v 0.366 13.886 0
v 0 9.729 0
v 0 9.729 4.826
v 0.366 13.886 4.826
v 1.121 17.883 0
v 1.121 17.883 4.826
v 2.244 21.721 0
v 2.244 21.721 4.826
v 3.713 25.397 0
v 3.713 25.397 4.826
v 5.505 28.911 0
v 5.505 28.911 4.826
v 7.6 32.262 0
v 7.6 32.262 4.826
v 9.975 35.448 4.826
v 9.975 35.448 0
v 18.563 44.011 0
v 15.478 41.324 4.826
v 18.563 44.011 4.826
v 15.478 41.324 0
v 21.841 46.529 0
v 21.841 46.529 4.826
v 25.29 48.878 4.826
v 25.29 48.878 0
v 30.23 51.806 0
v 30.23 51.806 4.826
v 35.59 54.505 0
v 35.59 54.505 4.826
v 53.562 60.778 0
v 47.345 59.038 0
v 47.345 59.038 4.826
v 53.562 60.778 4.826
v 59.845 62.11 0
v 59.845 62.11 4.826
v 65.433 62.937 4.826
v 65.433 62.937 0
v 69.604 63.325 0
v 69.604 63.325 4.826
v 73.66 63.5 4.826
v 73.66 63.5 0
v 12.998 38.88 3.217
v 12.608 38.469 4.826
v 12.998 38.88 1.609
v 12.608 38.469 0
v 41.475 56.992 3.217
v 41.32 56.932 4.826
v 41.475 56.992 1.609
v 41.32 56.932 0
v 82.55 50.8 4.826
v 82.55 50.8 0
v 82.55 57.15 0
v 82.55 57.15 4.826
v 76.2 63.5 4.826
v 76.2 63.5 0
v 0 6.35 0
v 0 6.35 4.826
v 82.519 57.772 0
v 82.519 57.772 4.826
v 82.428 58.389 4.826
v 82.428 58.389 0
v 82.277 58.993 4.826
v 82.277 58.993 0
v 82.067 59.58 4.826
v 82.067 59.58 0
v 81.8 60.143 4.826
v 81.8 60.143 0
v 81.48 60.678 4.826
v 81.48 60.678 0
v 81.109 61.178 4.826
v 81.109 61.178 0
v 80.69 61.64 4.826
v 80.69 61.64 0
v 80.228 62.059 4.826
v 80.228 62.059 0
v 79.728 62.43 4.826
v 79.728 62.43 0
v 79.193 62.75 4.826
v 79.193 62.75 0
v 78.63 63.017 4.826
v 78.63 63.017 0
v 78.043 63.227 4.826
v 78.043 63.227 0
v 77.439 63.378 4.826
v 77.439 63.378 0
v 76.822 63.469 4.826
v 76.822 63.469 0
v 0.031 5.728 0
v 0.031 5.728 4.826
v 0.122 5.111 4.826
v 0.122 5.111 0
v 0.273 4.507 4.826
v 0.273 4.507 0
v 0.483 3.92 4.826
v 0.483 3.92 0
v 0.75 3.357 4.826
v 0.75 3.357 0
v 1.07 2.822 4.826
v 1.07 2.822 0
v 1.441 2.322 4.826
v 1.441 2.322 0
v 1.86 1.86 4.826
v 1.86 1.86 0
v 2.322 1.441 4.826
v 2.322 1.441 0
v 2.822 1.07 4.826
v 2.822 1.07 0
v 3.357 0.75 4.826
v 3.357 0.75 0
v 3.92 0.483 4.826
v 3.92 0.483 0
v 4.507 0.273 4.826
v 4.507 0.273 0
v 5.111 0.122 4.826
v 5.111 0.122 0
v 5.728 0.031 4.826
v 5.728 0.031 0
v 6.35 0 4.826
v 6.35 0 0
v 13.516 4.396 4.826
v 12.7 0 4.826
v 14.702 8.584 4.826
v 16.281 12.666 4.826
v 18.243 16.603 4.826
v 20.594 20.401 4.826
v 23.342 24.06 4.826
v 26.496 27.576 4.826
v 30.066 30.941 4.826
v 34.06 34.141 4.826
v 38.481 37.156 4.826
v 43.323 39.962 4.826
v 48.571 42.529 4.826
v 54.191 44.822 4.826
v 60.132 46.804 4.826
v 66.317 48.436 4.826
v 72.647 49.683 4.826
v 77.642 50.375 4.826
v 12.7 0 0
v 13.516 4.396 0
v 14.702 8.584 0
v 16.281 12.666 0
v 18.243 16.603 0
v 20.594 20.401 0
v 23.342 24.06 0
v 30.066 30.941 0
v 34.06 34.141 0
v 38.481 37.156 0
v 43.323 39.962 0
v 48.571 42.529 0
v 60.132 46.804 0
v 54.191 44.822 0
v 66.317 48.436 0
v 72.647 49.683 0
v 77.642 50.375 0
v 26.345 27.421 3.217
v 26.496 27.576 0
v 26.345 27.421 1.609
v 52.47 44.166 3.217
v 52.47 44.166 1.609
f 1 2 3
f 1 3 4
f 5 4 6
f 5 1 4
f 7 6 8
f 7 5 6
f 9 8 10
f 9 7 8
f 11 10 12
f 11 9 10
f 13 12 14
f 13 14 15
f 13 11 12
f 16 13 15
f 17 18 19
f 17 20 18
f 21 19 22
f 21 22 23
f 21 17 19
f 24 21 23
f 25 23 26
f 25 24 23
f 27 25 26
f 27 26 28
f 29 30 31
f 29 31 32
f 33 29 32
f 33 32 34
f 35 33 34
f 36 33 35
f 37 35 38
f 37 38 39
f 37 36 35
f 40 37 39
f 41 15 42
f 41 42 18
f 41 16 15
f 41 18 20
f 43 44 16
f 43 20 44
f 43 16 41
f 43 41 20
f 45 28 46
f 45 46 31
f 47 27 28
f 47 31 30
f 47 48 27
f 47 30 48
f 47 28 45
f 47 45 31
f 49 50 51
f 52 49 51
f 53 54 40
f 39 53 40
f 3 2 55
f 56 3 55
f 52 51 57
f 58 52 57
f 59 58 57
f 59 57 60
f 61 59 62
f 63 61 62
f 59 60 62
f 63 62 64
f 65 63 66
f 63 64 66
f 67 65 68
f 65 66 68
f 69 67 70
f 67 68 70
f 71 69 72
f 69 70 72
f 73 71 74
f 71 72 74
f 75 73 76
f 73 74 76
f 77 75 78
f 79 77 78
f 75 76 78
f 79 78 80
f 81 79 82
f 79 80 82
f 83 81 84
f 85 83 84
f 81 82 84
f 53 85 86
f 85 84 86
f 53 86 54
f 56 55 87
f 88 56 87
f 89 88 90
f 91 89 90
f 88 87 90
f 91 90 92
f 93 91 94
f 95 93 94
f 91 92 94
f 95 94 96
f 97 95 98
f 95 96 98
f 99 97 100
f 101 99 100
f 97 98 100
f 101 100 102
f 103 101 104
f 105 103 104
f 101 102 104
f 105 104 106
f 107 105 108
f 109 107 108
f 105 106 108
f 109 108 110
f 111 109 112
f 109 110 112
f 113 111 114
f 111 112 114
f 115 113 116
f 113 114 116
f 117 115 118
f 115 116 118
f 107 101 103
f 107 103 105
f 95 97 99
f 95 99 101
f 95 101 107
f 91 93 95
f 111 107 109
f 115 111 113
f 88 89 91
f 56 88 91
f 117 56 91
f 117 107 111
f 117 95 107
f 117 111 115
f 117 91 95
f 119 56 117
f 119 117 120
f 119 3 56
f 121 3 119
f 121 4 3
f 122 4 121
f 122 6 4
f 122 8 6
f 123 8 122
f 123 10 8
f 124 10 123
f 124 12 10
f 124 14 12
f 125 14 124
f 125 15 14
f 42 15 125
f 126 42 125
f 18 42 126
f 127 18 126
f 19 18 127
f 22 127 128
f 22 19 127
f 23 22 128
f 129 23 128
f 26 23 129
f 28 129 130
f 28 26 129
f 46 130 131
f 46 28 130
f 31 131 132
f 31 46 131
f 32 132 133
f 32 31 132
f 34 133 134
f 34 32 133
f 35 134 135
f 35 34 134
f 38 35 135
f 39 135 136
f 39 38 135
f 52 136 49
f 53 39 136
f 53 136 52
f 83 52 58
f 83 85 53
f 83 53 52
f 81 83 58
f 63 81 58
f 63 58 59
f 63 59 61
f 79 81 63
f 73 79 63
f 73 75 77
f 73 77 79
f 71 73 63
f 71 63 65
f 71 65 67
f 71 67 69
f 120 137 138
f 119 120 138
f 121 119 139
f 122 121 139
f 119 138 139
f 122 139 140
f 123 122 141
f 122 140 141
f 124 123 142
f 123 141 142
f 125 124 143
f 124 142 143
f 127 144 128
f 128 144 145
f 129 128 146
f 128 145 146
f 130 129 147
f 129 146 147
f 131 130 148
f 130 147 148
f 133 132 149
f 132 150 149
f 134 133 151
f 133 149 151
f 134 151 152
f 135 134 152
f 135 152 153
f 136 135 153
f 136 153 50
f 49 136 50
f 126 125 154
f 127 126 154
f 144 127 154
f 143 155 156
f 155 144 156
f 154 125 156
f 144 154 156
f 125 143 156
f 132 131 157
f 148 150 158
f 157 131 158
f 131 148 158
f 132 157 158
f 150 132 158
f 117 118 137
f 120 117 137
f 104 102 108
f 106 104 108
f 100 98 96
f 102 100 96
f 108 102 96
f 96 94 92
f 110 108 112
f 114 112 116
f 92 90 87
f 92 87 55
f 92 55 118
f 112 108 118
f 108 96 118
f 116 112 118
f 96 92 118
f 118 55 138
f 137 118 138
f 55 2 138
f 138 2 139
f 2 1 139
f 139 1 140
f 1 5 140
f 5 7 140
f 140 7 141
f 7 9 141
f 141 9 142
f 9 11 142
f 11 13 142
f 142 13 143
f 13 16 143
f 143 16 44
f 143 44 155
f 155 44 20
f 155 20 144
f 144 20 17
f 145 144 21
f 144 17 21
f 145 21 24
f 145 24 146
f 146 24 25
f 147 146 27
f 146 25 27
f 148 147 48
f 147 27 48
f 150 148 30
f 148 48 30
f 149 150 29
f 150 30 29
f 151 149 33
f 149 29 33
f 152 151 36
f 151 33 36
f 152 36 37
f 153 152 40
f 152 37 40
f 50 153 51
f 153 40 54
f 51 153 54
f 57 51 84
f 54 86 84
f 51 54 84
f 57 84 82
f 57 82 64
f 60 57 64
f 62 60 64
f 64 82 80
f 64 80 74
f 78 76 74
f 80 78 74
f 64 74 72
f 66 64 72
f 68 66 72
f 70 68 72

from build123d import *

# Parameters (mm, degrees)
BOSS_EXTRUDE1_DEPTH = 4.826


with BuildPart() as part:
    # Sketch1 → Boss-Extrude1 (new body)
    with BuildSketch(Plane.XY):
        with BuildLine():
            ThreePointArc((0, 6.35), (1.859871939, 1.859871939), (6.35, 0))
            Line((6.35, 0), (12.7, 0))
            add(Edge.make_bspline(
                [(12.7, 0), (17.263490099, 32.946390999), (53.333433175, 49.033191713), (82.55, 50.8)],
                knots=[0, 0, 0, 0, 1, 1, 1, 1], degree=3))
            Line((82.55, 50.8), (82.55, 57.15))
            ThreePointArc((82.55, 57.15), (80.690128061, 61.640128061), (76.2, 63.5))
            Line((76.2, 63.5), (73.660464329, 63.5))
            add(Edge.make_bspline(
                [(0, 9.728566654), (1.333982387, 44.213527708), (43.545631304, 62.980228308), (73.660464329, 63.5)],
                knots=[0.030346022, 0.030346022, 0.030346022, 0.030346022, 0.973178261, 0.973178261, 0.973178261, 0.973178261], degree=3))
            Line((0, 9.728566654), (0, 6.35))
        make_face()
    extrude(amount=BOSS_EXTRUDE1_DEPTH)


solid = part.part
